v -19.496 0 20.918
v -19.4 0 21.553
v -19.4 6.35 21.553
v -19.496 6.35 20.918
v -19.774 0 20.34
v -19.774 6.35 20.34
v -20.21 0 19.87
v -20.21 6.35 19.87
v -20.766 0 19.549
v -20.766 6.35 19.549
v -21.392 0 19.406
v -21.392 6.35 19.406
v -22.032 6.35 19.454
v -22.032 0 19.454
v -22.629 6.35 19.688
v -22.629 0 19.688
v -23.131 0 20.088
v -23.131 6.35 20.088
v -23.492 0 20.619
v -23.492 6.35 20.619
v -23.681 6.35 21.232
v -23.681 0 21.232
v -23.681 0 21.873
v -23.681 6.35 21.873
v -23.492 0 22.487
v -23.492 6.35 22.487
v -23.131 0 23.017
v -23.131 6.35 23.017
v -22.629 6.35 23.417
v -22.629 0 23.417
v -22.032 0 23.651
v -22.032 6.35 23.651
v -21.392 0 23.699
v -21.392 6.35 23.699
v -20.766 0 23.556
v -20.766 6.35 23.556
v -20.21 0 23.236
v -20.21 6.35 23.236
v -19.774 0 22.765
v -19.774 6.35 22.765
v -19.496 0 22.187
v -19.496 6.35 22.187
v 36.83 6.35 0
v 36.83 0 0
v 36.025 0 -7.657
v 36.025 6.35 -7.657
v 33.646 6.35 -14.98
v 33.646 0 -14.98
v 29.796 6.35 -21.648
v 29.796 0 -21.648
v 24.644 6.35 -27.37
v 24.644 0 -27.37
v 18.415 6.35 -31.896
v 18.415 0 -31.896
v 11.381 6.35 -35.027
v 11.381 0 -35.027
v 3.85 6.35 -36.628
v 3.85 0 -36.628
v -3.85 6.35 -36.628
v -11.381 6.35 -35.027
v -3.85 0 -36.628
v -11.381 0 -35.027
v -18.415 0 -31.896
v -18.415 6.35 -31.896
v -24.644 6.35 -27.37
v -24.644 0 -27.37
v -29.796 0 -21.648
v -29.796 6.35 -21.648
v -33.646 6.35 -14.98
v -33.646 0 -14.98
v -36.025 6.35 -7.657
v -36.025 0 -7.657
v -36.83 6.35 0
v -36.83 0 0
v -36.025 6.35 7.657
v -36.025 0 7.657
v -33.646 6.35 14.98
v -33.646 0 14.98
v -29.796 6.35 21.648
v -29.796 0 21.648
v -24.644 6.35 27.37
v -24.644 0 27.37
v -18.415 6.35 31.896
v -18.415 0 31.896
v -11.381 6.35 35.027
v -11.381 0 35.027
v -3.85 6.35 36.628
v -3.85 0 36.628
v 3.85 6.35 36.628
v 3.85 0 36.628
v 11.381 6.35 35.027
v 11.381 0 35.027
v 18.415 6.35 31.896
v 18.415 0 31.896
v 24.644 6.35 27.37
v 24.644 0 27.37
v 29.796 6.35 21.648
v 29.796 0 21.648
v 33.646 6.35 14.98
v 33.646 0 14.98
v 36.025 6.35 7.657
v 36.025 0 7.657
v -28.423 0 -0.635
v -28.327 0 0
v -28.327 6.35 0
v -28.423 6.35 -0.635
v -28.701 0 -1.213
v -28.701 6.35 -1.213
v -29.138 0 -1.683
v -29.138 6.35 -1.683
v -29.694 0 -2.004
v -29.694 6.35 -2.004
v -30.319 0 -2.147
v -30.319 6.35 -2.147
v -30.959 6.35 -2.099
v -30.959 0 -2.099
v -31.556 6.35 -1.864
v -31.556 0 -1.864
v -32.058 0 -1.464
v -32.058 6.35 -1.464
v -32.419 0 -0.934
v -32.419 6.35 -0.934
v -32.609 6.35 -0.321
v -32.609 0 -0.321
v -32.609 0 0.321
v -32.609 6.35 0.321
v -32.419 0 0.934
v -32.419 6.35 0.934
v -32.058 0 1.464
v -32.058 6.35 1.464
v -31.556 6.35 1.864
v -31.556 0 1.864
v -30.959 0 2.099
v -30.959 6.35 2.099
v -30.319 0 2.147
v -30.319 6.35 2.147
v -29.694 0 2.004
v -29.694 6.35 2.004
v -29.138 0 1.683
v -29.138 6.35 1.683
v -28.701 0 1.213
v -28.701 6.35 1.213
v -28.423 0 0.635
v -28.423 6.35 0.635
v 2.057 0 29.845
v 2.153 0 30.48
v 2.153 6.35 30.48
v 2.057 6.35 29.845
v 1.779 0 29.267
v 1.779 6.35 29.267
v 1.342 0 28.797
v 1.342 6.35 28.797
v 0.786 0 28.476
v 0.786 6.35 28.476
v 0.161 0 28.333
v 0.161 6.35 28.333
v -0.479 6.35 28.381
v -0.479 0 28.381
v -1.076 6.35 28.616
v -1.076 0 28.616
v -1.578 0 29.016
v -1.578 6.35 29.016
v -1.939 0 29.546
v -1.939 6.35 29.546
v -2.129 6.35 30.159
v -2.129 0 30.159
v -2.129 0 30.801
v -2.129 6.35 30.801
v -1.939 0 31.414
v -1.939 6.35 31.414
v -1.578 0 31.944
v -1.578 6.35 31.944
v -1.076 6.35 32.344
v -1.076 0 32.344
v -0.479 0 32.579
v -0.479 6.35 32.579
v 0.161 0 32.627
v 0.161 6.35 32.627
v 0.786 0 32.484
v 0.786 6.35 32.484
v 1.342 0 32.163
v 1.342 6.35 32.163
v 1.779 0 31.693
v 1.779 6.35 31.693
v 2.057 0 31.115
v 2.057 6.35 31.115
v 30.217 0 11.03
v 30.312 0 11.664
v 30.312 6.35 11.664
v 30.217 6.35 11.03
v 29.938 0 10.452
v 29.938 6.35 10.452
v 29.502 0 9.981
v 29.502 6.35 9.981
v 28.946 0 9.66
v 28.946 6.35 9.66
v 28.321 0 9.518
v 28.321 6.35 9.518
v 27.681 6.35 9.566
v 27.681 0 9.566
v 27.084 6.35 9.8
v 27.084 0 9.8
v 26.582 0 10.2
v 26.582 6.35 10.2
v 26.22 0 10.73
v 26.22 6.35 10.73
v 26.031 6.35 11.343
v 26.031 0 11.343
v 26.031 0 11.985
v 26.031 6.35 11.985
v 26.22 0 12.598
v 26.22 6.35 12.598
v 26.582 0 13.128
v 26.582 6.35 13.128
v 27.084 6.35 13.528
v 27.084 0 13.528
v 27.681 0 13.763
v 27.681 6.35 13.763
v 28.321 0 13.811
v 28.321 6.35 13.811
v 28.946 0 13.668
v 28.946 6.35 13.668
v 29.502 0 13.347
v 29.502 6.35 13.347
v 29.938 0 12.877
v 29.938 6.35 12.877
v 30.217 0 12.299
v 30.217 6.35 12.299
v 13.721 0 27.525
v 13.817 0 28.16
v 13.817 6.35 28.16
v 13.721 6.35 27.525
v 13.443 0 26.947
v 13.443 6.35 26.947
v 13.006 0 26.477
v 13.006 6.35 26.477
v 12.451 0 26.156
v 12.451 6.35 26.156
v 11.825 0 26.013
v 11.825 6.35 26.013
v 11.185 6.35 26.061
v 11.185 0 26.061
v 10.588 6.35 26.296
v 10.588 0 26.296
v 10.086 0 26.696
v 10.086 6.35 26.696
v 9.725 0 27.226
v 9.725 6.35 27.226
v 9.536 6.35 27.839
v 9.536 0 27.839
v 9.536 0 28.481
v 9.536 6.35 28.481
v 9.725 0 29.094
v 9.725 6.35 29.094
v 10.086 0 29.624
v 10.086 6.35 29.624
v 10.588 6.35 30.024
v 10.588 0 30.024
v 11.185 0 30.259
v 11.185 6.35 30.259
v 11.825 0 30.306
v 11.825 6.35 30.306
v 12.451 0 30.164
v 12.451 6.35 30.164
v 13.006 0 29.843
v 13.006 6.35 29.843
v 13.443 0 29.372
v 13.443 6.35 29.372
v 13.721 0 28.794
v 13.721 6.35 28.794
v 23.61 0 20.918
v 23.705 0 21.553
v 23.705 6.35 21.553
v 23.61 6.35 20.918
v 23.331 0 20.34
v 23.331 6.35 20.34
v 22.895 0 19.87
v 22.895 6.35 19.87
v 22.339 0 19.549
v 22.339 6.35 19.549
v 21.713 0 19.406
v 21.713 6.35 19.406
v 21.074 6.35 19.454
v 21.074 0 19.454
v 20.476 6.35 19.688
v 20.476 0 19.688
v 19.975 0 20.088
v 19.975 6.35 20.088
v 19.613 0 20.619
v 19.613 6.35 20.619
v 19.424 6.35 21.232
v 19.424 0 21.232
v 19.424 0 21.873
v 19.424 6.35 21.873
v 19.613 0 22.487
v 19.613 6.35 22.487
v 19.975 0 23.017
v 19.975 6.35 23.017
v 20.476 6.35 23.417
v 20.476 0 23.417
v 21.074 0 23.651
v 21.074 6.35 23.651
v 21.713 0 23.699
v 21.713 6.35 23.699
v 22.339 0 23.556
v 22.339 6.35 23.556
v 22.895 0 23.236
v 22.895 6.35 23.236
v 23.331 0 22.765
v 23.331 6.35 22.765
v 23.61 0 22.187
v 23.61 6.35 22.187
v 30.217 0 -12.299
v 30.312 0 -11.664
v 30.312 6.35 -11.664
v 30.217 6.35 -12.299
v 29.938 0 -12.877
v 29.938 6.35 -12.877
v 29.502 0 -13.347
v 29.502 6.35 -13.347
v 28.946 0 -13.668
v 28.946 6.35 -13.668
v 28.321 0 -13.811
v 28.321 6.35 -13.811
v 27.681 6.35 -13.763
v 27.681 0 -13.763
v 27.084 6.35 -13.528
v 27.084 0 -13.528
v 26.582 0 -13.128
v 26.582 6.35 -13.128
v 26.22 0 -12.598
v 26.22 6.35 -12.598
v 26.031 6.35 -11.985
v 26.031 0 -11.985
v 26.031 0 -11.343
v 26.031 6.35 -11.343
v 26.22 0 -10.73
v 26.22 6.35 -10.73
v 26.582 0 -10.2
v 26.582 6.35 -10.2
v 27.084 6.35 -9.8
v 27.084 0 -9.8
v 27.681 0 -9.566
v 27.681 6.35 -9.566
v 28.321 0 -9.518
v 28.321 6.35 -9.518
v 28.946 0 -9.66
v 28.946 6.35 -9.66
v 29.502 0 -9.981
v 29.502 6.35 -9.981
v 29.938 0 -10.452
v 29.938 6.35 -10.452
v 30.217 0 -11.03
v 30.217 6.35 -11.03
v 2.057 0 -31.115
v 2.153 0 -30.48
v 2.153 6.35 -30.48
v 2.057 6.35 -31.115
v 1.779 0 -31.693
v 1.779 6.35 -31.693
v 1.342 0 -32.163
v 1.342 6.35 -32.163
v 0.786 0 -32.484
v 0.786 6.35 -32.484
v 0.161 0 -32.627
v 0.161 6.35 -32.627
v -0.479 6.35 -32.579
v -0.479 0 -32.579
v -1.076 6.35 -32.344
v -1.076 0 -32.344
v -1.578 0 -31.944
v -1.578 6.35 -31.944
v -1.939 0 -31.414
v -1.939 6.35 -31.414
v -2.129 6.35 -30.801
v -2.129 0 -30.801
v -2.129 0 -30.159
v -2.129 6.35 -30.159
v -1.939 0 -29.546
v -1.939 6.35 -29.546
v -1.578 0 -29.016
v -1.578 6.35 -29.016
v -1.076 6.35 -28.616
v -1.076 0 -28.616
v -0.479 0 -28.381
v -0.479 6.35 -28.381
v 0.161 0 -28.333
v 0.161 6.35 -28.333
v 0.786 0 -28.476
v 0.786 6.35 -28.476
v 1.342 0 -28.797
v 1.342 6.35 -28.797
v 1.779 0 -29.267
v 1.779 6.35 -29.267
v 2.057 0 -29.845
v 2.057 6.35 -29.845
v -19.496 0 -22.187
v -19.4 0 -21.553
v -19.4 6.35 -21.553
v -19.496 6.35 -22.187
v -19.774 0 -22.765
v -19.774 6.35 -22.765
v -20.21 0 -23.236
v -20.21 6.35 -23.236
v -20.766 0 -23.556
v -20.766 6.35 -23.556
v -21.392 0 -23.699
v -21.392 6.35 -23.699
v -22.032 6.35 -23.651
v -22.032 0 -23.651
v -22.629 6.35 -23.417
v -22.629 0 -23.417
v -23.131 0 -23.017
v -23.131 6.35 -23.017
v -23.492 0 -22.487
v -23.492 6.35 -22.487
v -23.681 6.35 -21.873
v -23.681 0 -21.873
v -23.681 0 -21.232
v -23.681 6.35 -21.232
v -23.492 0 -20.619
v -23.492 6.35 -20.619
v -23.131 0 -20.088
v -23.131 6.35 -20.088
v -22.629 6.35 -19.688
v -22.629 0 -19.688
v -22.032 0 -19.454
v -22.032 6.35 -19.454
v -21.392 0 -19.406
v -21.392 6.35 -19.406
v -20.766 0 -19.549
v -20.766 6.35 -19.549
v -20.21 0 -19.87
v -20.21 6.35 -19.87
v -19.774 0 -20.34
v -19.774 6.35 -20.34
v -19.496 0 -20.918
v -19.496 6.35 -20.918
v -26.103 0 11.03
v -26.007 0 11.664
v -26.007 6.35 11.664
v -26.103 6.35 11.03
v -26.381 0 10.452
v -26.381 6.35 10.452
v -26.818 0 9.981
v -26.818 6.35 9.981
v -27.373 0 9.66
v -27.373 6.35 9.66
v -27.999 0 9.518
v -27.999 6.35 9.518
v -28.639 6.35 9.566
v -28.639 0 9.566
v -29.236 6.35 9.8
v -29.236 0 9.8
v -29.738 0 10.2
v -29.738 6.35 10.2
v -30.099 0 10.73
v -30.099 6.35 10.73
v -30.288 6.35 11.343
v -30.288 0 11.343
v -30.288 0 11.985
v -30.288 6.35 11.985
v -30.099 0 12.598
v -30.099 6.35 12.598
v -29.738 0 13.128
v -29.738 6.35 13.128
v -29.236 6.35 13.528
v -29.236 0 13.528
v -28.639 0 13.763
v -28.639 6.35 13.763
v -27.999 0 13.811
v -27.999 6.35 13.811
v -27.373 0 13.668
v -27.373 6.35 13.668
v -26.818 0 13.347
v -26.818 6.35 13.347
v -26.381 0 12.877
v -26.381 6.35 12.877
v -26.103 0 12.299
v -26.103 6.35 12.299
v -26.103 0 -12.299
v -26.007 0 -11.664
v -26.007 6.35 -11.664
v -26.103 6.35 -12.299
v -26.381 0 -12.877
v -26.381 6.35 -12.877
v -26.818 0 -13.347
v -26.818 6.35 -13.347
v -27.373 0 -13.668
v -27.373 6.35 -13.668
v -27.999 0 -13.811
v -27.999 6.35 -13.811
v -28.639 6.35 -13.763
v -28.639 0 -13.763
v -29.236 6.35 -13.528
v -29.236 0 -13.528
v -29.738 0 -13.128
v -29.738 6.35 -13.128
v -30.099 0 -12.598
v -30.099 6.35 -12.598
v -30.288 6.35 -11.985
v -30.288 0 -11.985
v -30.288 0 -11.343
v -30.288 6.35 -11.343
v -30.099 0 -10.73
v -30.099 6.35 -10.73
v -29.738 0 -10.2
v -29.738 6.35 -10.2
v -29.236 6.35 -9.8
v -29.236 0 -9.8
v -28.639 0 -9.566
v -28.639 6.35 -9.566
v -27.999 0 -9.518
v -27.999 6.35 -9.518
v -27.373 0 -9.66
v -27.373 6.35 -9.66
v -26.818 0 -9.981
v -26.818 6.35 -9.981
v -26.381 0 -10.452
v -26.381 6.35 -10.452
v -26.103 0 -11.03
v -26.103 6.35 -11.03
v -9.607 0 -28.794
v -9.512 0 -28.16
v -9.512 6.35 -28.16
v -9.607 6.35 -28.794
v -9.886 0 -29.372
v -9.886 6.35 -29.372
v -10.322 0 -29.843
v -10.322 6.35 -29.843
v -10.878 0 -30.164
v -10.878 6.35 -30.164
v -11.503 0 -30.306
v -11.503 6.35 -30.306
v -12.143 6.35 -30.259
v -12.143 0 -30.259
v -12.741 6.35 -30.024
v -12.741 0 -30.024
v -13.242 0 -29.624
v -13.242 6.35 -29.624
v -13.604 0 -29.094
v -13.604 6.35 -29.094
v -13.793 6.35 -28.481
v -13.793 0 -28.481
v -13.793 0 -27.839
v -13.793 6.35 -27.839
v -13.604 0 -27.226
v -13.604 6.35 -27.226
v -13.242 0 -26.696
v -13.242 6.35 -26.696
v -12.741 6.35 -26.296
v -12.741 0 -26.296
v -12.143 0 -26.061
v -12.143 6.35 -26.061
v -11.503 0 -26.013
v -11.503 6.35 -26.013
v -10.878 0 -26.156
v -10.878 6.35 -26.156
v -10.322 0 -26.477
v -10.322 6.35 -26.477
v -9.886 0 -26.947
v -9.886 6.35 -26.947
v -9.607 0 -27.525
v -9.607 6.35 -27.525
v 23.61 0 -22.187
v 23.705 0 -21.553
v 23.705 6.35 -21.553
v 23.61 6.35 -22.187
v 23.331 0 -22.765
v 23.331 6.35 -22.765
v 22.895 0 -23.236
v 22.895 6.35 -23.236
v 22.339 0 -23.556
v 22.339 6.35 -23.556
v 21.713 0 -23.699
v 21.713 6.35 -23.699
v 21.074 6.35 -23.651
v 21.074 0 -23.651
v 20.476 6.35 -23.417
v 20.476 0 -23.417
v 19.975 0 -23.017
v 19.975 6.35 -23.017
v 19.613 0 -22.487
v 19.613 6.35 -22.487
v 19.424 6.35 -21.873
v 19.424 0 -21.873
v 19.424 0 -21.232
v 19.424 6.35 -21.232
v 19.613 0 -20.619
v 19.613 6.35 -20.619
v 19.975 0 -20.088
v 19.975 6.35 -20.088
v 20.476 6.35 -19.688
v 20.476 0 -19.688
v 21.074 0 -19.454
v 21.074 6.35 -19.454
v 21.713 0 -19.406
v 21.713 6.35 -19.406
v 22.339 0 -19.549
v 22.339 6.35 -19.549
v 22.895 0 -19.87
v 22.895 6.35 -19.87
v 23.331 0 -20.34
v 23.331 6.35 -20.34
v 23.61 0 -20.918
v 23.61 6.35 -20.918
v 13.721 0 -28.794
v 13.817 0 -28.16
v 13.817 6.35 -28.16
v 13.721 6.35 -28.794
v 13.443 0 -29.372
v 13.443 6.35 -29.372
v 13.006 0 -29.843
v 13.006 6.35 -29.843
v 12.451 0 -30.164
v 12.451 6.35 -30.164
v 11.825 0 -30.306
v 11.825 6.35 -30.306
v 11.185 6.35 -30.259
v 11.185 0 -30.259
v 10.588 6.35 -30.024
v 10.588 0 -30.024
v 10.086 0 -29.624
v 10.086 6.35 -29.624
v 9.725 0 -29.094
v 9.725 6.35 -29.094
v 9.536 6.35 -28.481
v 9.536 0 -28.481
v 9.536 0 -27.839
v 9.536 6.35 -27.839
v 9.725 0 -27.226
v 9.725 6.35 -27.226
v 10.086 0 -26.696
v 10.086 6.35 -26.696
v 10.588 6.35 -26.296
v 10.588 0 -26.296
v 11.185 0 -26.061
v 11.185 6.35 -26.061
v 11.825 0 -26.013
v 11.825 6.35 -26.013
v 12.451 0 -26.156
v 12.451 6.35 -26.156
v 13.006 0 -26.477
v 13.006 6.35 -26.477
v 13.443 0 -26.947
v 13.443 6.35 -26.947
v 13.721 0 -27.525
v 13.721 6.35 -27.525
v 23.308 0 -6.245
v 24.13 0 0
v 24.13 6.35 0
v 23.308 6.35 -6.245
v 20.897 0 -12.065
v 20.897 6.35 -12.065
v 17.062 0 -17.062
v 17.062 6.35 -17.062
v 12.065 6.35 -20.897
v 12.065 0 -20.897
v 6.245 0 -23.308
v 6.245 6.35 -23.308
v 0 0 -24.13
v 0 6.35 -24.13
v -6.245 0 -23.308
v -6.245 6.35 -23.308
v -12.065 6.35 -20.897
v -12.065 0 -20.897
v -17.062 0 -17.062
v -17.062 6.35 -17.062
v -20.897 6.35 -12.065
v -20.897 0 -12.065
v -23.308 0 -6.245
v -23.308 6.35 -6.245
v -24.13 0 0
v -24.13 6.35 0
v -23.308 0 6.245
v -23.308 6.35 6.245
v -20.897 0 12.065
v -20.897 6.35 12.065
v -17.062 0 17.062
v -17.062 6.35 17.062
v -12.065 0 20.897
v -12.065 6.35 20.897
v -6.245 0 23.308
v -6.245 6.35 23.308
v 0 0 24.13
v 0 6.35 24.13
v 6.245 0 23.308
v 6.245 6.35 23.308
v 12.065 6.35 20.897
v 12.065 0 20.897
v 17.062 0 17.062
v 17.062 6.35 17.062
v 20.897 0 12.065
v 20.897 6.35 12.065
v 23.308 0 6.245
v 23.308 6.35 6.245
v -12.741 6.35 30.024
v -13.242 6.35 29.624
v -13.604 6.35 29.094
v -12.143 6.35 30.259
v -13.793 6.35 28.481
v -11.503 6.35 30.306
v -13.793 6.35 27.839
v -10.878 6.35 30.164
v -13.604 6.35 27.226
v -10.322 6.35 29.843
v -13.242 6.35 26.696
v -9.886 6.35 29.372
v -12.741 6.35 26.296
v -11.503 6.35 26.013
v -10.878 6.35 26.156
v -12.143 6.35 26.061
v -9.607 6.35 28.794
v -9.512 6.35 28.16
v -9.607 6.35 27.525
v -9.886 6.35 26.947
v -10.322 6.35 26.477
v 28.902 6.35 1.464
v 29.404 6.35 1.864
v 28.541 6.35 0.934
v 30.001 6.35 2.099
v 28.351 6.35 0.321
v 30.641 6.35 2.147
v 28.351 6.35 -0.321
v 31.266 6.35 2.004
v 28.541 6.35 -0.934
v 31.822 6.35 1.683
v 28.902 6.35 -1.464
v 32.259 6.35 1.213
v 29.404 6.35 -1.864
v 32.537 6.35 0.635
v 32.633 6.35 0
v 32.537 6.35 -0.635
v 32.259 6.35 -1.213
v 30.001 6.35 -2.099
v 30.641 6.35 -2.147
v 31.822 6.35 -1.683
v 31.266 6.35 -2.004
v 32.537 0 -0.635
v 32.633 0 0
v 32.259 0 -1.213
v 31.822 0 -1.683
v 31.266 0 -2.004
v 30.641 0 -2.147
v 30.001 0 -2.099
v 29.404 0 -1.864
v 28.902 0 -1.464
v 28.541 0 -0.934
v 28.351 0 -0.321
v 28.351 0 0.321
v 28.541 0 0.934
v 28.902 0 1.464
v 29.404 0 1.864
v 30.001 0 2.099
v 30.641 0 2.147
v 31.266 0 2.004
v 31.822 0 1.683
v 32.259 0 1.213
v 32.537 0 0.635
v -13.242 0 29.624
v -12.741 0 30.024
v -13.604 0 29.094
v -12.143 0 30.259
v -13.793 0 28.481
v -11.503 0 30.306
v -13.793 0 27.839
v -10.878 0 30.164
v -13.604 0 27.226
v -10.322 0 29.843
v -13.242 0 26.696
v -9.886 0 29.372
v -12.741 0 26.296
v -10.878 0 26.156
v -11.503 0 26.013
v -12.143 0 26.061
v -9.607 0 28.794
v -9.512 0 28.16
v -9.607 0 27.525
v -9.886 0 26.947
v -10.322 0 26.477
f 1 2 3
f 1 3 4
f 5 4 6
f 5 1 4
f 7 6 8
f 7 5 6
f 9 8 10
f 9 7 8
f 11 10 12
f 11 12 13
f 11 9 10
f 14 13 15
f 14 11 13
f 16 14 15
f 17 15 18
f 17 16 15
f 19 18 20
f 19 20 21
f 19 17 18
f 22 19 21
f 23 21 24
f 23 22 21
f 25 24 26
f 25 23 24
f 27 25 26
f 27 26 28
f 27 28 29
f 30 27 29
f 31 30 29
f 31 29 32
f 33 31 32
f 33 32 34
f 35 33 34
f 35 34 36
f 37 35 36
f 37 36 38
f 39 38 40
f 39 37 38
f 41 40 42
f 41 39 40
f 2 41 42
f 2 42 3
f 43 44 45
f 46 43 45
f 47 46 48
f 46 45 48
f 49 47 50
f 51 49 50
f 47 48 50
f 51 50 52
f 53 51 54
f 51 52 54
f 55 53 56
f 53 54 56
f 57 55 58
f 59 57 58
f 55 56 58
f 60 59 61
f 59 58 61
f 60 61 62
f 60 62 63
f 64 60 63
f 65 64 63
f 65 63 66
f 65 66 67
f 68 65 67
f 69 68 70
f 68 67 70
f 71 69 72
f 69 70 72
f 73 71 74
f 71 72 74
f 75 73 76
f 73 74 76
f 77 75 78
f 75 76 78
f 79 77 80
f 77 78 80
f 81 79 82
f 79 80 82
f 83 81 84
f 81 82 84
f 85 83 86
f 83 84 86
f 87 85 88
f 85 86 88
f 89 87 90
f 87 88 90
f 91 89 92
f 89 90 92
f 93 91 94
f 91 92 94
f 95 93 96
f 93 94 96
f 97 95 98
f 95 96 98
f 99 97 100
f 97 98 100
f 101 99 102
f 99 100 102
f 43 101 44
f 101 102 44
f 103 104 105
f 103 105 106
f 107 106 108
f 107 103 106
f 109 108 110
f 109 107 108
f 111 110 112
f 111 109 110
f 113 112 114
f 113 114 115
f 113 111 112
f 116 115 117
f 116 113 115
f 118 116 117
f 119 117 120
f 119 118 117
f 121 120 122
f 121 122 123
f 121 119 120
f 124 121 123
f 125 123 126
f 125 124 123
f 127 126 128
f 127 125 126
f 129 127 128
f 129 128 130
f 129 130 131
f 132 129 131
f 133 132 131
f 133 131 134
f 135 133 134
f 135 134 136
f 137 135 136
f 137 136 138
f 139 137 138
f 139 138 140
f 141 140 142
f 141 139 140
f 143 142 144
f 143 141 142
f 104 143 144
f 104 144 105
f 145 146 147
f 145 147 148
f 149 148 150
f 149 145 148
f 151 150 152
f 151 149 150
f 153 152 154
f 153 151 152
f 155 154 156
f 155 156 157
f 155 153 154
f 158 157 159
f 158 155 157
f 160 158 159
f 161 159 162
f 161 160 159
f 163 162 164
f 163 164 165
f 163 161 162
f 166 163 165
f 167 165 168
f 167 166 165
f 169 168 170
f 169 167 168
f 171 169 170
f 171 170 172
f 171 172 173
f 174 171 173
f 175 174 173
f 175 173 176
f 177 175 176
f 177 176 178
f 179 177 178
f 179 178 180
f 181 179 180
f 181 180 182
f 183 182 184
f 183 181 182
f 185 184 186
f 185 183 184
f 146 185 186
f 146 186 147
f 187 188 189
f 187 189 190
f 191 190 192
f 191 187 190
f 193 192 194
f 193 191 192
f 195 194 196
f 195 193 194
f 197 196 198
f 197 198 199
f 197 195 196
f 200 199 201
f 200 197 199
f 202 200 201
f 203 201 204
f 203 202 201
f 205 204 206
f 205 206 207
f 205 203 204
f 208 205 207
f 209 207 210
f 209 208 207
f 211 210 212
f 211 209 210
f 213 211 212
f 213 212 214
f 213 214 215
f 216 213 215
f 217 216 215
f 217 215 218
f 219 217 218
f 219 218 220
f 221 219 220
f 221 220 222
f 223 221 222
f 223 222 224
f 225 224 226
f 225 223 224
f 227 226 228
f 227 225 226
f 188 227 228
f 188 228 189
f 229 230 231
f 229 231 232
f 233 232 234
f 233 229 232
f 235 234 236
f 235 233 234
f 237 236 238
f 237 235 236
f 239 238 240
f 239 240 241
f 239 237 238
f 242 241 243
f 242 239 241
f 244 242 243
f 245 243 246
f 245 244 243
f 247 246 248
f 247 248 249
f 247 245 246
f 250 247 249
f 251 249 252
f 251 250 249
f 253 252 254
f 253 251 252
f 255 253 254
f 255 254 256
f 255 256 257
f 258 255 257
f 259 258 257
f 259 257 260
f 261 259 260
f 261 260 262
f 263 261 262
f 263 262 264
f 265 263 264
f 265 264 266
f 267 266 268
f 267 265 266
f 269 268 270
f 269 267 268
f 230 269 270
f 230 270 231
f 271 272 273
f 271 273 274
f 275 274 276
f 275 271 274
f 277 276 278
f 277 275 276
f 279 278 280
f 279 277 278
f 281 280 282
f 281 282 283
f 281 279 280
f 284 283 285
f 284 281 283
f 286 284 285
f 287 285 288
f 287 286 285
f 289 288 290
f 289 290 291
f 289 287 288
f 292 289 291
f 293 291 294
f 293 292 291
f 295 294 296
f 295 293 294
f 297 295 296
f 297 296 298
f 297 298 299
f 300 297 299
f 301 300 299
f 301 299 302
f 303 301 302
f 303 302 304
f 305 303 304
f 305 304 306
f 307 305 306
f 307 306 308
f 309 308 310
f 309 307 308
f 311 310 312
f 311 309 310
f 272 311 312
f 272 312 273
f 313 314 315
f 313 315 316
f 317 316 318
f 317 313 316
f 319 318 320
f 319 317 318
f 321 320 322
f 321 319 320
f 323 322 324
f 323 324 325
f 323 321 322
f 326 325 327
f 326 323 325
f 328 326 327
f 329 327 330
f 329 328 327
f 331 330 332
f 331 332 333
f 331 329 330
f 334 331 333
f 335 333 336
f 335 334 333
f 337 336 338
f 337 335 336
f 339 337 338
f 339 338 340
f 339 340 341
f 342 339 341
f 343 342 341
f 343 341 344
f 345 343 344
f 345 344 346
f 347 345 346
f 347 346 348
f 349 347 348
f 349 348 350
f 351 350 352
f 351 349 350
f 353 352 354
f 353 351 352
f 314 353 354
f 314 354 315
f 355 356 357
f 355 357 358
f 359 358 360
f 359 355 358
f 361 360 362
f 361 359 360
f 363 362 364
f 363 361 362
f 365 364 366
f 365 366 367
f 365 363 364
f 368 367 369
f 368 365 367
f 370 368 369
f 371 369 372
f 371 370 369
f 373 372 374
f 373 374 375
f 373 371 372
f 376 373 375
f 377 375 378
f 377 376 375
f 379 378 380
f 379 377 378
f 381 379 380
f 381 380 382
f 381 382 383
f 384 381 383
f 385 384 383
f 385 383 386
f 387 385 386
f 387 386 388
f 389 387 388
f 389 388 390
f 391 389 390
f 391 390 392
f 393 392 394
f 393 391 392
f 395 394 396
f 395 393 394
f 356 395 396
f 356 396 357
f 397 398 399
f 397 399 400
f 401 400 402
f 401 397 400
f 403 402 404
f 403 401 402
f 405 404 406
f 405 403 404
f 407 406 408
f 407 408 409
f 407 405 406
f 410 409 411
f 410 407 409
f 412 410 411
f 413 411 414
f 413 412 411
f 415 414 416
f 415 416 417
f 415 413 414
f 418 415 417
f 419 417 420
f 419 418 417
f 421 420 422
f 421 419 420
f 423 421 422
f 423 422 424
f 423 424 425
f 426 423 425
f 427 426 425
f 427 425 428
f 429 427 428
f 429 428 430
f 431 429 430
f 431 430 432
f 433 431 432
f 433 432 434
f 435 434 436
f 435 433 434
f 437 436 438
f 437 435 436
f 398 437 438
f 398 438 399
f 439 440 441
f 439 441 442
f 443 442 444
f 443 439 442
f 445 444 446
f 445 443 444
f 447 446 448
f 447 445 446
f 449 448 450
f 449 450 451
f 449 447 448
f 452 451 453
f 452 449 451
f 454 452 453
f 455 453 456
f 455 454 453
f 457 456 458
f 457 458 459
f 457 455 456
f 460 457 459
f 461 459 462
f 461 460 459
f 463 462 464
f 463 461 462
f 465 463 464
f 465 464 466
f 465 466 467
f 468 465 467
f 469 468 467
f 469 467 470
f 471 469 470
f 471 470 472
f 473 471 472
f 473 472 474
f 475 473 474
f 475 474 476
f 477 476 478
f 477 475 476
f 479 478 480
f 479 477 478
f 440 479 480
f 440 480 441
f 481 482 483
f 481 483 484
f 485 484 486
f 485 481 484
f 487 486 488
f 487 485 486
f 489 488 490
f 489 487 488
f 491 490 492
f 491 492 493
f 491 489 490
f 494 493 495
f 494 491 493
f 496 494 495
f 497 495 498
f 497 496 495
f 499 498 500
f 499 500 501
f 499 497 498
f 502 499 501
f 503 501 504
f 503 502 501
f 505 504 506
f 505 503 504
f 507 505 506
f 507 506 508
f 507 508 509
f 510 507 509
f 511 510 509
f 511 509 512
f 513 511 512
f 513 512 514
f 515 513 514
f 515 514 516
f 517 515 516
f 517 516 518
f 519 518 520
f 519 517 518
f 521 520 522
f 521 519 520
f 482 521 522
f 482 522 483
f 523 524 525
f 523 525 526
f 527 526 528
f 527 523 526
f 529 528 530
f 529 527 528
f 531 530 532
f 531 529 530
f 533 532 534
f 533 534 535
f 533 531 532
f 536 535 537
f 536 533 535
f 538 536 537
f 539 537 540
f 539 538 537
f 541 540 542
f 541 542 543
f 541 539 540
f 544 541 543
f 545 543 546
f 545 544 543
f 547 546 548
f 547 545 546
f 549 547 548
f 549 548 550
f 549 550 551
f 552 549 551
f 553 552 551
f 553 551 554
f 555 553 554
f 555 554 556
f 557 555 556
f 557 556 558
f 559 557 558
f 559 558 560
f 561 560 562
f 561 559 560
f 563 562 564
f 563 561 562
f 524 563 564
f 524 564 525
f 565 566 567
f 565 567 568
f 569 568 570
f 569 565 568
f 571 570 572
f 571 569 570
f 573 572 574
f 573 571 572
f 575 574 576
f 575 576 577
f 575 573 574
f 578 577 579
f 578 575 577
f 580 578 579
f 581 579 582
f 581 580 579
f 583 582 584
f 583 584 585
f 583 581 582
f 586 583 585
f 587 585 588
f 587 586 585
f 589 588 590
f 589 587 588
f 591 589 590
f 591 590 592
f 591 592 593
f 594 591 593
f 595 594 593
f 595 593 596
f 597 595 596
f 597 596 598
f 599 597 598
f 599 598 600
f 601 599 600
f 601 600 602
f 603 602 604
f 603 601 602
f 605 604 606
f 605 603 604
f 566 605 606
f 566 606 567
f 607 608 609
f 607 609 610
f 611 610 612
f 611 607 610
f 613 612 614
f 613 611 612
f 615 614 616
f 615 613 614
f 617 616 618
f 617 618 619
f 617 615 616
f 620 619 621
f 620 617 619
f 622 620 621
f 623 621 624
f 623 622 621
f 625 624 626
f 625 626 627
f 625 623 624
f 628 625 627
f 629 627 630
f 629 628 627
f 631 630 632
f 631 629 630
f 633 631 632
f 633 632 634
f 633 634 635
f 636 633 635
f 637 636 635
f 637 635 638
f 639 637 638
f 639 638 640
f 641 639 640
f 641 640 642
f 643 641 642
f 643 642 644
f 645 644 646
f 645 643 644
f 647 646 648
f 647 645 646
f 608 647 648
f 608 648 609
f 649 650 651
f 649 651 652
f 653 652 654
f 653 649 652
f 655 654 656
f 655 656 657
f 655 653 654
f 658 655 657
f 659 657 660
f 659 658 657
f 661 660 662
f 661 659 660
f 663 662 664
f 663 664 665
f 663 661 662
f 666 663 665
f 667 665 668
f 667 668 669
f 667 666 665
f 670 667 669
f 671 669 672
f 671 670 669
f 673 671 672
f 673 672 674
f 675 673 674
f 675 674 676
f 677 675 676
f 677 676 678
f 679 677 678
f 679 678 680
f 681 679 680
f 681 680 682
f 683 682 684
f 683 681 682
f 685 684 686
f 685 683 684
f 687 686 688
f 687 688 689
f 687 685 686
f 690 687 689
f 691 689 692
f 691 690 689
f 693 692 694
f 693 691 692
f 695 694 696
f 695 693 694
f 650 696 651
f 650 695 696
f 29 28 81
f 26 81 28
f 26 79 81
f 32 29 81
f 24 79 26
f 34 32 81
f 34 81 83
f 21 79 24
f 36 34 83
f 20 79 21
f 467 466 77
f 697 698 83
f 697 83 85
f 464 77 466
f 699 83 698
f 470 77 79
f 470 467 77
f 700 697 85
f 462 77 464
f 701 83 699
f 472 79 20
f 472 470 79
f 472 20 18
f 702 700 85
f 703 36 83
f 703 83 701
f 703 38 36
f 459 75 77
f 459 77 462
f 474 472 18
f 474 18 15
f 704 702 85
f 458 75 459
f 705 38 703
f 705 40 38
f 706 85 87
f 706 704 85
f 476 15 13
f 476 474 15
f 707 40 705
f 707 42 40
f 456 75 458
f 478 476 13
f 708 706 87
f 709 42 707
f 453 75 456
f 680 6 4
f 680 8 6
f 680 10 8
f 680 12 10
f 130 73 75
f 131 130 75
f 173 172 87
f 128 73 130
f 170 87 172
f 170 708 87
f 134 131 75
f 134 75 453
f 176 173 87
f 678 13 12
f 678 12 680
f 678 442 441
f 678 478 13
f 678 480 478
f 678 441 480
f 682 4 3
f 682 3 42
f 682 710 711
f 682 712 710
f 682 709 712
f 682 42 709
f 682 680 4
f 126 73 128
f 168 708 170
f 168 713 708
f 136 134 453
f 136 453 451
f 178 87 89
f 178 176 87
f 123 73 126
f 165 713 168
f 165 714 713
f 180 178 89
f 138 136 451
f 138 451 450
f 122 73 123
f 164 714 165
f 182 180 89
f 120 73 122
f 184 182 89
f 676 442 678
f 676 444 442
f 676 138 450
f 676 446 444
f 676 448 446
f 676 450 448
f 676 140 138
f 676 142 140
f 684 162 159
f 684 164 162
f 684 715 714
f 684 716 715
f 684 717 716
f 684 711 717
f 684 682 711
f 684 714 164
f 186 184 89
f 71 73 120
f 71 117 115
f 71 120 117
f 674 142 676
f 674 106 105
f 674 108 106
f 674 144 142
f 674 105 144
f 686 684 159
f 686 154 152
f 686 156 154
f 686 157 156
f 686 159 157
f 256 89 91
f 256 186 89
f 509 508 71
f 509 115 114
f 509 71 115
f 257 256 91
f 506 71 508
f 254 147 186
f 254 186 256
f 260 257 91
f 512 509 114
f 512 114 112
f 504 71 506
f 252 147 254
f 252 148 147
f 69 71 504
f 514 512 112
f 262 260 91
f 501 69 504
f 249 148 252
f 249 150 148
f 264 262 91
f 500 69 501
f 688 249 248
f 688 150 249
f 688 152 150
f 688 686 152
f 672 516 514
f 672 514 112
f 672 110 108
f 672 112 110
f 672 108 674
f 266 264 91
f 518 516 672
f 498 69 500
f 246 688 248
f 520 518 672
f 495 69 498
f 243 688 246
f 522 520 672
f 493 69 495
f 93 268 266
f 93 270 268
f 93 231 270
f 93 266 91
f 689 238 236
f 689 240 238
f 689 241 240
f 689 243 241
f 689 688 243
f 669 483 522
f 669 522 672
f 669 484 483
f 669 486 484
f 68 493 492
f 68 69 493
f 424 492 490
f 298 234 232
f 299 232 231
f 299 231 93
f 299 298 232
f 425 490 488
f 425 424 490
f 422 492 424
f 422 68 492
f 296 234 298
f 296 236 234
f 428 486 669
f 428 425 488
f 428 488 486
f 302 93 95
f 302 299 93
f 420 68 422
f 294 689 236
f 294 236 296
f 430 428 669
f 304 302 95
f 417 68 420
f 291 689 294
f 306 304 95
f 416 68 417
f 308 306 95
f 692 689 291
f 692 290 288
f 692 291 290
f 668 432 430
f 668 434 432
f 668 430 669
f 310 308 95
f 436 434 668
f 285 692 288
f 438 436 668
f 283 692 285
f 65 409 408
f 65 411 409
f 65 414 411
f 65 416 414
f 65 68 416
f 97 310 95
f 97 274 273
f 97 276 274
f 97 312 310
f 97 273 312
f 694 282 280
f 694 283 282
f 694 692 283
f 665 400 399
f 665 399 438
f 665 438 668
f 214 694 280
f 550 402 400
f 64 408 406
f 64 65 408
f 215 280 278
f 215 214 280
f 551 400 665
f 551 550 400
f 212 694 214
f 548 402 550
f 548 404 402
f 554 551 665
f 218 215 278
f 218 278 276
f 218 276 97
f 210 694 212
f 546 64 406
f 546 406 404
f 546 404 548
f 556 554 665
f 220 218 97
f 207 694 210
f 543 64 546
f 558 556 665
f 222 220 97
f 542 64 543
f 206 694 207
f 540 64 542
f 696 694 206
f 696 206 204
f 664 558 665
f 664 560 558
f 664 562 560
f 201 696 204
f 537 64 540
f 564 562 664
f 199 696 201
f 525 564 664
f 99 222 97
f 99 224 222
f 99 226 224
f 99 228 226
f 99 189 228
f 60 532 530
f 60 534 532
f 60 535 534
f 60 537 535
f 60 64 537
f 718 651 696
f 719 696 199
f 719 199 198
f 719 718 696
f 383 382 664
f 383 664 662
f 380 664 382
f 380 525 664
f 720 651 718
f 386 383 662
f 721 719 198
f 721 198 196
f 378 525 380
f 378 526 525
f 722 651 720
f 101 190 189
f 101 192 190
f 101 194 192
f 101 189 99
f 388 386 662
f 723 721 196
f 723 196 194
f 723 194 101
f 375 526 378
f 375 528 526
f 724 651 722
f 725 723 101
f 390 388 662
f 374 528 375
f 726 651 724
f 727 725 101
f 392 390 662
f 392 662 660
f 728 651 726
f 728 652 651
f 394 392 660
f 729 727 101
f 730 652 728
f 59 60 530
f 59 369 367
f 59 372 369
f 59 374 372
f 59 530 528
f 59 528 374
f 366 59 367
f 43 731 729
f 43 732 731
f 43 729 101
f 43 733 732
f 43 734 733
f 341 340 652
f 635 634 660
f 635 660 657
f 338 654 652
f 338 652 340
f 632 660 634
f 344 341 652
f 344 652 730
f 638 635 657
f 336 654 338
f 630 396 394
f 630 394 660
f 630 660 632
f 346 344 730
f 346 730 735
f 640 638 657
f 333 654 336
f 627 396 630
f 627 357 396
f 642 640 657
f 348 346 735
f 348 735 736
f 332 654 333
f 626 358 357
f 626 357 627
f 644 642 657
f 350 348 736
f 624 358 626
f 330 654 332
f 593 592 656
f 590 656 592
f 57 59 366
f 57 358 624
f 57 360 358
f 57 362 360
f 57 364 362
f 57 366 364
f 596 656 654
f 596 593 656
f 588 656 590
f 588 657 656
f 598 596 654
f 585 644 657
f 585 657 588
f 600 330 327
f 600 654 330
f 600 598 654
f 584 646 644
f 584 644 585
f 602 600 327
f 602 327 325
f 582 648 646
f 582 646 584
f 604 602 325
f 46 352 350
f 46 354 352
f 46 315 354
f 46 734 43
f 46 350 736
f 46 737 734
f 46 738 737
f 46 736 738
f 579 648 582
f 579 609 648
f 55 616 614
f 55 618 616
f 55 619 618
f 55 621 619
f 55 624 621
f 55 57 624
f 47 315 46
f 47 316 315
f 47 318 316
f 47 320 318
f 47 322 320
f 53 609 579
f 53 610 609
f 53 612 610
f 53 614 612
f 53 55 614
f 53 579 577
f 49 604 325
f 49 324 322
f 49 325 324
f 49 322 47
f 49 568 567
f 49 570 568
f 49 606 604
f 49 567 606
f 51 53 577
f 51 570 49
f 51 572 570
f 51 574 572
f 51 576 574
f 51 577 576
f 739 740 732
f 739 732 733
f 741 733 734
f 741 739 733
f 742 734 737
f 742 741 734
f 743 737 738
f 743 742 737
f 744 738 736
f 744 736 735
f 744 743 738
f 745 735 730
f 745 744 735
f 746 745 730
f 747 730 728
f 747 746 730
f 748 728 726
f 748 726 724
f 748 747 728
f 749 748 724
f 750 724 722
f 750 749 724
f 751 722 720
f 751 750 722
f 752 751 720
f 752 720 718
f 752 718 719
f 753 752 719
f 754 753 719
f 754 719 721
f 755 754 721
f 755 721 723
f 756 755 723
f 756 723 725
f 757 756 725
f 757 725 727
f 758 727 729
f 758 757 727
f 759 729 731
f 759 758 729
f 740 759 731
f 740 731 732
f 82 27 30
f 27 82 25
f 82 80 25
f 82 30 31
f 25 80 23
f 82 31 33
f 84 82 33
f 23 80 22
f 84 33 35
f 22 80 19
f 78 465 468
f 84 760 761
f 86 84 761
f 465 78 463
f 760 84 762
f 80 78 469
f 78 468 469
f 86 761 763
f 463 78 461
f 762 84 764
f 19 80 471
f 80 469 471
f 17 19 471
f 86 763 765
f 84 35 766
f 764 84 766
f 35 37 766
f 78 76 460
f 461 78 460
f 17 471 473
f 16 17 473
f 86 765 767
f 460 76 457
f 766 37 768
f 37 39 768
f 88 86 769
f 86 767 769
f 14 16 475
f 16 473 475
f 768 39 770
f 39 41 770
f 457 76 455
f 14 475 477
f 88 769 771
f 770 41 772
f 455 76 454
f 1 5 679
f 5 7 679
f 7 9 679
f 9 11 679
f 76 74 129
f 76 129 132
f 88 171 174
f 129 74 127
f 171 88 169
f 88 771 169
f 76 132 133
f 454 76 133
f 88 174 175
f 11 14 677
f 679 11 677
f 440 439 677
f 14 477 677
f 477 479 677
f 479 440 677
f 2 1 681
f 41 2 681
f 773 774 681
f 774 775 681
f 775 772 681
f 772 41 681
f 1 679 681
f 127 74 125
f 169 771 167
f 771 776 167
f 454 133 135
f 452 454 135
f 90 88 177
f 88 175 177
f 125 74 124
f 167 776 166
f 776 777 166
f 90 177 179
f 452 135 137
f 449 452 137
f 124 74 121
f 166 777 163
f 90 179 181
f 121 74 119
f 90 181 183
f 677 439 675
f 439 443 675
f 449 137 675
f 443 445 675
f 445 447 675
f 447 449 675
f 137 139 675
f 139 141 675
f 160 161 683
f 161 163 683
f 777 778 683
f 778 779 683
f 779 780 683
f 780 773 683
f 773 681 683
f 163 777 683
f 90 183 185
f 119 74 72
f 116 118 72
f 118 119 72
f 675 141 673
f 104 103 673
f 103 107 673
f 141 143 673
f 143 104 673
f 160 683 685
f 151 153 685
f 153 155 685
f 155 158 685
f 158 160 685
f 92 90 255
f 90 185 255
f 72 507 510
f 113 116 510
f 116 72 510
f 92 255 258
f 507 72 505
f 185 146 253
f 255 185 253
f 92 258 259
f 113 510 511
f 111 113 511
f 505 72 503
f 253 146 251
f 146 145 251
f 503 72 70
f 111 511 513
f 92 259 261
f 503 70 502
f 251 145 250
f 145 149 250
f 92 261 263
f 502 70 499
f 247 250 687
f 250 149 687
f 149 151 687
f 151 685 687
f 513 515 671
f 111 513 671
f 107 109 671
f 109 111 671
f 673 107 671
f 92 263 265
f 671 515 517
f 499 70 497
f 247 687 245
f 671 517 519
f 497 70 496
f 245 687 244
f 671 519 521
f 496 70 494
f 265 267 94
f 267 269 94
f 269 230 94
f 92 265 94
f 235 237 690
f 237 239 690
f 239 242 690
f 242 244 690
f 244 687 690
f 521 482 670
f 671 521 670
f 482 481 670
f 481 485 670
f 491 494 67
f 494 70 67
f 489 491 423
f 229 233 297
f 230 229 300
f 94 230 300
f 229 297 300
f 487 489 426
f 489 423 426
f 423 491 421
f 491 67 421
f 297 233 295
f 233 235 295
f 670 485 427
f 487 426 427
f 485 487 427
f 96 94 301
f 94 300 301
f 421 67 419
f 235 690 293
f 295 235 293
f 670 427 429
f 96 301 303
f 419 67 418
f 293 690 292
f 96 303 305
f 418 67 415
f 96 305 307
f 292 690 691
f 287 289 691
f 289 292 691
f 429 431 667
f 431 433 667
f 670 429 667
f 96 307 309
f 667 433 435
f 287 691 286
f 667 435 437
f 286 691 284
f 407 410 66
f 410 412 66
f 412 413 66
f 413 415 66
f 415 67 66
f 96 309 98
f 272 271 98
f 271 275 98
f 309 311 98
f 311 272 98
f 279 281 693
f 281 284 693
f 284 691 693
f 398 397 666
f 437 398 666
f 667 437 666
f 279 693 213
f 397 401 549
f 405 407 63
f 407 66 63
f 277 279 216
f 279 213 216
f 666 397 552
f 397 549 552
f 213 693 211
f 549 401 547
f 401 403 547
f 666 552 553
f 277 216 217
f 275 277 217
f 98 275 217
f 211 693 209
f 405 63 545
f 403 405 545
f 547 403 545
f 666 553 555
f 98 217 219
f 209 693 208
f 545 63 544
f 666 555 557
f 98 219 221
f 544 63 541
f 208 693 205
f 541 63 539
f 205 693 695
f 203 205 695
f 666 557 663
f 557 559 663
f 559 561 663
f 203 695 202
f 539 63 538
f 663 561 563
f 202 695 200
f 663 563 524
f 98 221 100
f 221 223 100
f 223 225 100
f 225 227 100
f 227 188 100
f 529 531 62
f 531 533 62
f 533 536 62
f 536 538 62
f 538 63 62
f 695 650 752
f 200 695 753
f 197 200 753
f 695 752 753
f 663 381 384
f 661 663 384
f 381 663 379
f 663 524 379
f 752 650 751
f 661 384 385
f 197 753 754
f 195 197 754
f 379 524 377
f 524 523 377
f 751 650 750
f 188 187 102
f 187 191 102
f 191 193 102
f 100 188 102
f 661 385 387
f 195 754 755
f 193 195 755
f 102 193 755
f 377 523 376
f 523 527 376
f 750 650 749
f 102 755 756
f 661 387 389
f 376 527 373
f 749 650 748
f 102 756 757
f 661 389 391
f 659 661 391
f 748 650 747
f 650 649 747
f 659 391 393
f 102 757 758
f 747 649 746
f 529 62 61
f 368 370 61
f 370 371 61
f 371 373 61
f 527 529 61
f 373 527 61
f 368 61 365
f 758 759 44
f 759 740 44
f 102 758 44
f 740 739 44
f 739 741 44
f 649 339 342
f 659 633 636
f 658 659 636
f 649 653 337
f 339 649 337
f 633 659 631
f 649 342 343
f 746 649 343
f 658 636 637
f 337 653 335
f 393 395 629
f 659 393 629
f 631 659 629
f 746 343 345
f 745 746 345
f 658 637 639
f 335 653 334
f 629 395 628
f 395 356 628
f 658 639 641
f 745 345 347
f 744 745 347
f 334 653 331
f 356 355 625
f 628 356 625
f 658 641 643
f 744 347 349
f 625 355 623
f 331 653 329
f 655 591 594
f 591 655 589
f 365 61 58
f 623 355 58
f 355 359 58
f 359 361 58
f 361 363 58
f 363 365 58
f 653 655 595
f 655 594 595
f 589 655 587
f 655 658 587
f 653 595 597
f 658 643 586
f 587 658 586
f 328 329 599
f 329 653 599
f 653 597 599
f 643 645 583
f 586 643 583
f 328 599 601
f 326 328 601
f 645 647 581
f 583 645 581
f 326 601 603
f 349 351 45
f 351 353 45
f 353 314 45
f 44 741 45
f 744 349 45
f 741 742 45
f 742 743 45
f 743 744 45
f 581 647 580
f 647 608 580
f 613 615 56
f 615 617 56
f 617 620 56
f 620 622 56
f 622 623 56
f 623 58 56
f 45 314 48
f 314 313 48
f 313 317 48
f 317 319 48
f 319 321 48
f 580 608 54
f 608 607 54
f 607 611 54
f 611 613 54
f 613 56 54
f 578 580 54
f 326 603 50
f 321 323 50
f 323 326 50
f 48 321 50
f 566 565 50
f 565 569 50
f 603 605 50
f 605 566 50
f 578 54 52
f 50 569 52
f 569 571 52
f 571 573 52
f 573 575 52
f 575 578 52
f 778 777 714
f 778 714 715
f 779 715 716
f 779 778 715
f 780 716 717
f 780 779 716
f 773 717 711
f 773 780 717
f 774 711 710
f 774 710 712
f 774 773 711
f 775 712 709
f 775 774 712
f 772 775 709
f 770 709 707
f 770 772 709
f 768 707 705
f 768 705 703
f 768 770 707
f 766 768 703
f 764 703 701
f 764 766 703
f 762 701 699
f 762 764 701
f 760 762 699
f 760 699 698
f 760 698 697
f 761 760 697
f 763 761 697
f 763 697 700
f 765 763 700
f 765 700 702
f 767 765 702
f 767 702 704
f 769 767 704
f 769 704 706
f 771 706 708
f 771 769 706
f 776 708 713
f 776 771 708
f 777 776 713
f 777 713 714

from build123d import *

# Parameters (mm, degrees)
SKETCH1_R           = 36.83
SKETCH1_R_2         = 24.13
SKETCH1_R_3         = 2.15265
BOSS_EXTRUDE1_DEPTH = 6.35


with BuildPart() as part:
    # Sketch1 → Boss-Extrude1 (new body)
    with BuildSketch(Plane(origin=(0, 0, 0), x_dir=(1, 0, 0), z_dir=(0, 1, 0))):
        Circle(SKETCH1_R)
        Circle(SKETCH1_R_2, mode=Mode.SUBTRACT)
        with Locations((0, 30.48)):
            Circle(SKETCH1_R_3, mode=Mode.SUBTRACT)
        with Locations((11.664191018, 28.159848151)):
            Circle(SKETCH1_R_3, mode=Mode.SUBTRACT)
        with Locations((21.552614691, 21.552614691)):
            Circle(SKETCH1_R_3, mode=Mode.SUBTRACT)
        with Locations((28.159848151, 11.664191018)):
            Circle(SKETCH1_R_3, mode=Mode.SUBTRACT)
        with Locations((30.48, 0)):
            Circle(SKETCH1_R_3, mode=Mode.SUBTRACT)
        with Locations((28.159848151, -11.664191018)):
            Circle(SKETCH1_R_3, mode=Mode.SUBTRACT)
        with Locations((21.552614691, -21.552614691)):
            Circle(SKETCH1_R_3, mode=Mode.SUBTRACT)
        with Locations((11.664191018, -28.159848151)):
            Circle(SKETCH1_R_3, mode=Mode.SUBTRACT)
        with Locations((0, -30.48)):
            Circle(SKETCH1_R_3, mode=Mode.SUBTRACT)
        with Locations((-11.664191018, -28.159848151)):
            Circle(SKETCH1_R_3, mode=Mode.SUBTRACT)
        with Locations((-21.552614691, -21.552614691)):
            Circle(SKETCH1_R_3, mode=Mode.SUBTRACT)
        with Locations((-28.159848151, -11.664191018)):
            Circle(SKETCH1_R_3, mode=Mode.SUBTRACT)
        with Locations((-30.48, 0)):
            Circle(SKETCH1_R_3, mode=Mode.SUBTRACT)
        with Locations((-28.159848151, 11.664191018)):
            Circle(SKETCH1_R_3, mode=Mode.SUBTRACT)
        with Locations((-21.552614691, 21.552614691)):
            Circle(SKETCH1_R_3, mode=Mode.SUBTRACT)
        with Locations((-11.664191018, 28.159848151)):
            Circle(SKETCH1_R_3, mode=Mode.SUBTRACT)
    extrude(amount=BOSS_EXTRUDE1_DEPTH)


solid = part.part
